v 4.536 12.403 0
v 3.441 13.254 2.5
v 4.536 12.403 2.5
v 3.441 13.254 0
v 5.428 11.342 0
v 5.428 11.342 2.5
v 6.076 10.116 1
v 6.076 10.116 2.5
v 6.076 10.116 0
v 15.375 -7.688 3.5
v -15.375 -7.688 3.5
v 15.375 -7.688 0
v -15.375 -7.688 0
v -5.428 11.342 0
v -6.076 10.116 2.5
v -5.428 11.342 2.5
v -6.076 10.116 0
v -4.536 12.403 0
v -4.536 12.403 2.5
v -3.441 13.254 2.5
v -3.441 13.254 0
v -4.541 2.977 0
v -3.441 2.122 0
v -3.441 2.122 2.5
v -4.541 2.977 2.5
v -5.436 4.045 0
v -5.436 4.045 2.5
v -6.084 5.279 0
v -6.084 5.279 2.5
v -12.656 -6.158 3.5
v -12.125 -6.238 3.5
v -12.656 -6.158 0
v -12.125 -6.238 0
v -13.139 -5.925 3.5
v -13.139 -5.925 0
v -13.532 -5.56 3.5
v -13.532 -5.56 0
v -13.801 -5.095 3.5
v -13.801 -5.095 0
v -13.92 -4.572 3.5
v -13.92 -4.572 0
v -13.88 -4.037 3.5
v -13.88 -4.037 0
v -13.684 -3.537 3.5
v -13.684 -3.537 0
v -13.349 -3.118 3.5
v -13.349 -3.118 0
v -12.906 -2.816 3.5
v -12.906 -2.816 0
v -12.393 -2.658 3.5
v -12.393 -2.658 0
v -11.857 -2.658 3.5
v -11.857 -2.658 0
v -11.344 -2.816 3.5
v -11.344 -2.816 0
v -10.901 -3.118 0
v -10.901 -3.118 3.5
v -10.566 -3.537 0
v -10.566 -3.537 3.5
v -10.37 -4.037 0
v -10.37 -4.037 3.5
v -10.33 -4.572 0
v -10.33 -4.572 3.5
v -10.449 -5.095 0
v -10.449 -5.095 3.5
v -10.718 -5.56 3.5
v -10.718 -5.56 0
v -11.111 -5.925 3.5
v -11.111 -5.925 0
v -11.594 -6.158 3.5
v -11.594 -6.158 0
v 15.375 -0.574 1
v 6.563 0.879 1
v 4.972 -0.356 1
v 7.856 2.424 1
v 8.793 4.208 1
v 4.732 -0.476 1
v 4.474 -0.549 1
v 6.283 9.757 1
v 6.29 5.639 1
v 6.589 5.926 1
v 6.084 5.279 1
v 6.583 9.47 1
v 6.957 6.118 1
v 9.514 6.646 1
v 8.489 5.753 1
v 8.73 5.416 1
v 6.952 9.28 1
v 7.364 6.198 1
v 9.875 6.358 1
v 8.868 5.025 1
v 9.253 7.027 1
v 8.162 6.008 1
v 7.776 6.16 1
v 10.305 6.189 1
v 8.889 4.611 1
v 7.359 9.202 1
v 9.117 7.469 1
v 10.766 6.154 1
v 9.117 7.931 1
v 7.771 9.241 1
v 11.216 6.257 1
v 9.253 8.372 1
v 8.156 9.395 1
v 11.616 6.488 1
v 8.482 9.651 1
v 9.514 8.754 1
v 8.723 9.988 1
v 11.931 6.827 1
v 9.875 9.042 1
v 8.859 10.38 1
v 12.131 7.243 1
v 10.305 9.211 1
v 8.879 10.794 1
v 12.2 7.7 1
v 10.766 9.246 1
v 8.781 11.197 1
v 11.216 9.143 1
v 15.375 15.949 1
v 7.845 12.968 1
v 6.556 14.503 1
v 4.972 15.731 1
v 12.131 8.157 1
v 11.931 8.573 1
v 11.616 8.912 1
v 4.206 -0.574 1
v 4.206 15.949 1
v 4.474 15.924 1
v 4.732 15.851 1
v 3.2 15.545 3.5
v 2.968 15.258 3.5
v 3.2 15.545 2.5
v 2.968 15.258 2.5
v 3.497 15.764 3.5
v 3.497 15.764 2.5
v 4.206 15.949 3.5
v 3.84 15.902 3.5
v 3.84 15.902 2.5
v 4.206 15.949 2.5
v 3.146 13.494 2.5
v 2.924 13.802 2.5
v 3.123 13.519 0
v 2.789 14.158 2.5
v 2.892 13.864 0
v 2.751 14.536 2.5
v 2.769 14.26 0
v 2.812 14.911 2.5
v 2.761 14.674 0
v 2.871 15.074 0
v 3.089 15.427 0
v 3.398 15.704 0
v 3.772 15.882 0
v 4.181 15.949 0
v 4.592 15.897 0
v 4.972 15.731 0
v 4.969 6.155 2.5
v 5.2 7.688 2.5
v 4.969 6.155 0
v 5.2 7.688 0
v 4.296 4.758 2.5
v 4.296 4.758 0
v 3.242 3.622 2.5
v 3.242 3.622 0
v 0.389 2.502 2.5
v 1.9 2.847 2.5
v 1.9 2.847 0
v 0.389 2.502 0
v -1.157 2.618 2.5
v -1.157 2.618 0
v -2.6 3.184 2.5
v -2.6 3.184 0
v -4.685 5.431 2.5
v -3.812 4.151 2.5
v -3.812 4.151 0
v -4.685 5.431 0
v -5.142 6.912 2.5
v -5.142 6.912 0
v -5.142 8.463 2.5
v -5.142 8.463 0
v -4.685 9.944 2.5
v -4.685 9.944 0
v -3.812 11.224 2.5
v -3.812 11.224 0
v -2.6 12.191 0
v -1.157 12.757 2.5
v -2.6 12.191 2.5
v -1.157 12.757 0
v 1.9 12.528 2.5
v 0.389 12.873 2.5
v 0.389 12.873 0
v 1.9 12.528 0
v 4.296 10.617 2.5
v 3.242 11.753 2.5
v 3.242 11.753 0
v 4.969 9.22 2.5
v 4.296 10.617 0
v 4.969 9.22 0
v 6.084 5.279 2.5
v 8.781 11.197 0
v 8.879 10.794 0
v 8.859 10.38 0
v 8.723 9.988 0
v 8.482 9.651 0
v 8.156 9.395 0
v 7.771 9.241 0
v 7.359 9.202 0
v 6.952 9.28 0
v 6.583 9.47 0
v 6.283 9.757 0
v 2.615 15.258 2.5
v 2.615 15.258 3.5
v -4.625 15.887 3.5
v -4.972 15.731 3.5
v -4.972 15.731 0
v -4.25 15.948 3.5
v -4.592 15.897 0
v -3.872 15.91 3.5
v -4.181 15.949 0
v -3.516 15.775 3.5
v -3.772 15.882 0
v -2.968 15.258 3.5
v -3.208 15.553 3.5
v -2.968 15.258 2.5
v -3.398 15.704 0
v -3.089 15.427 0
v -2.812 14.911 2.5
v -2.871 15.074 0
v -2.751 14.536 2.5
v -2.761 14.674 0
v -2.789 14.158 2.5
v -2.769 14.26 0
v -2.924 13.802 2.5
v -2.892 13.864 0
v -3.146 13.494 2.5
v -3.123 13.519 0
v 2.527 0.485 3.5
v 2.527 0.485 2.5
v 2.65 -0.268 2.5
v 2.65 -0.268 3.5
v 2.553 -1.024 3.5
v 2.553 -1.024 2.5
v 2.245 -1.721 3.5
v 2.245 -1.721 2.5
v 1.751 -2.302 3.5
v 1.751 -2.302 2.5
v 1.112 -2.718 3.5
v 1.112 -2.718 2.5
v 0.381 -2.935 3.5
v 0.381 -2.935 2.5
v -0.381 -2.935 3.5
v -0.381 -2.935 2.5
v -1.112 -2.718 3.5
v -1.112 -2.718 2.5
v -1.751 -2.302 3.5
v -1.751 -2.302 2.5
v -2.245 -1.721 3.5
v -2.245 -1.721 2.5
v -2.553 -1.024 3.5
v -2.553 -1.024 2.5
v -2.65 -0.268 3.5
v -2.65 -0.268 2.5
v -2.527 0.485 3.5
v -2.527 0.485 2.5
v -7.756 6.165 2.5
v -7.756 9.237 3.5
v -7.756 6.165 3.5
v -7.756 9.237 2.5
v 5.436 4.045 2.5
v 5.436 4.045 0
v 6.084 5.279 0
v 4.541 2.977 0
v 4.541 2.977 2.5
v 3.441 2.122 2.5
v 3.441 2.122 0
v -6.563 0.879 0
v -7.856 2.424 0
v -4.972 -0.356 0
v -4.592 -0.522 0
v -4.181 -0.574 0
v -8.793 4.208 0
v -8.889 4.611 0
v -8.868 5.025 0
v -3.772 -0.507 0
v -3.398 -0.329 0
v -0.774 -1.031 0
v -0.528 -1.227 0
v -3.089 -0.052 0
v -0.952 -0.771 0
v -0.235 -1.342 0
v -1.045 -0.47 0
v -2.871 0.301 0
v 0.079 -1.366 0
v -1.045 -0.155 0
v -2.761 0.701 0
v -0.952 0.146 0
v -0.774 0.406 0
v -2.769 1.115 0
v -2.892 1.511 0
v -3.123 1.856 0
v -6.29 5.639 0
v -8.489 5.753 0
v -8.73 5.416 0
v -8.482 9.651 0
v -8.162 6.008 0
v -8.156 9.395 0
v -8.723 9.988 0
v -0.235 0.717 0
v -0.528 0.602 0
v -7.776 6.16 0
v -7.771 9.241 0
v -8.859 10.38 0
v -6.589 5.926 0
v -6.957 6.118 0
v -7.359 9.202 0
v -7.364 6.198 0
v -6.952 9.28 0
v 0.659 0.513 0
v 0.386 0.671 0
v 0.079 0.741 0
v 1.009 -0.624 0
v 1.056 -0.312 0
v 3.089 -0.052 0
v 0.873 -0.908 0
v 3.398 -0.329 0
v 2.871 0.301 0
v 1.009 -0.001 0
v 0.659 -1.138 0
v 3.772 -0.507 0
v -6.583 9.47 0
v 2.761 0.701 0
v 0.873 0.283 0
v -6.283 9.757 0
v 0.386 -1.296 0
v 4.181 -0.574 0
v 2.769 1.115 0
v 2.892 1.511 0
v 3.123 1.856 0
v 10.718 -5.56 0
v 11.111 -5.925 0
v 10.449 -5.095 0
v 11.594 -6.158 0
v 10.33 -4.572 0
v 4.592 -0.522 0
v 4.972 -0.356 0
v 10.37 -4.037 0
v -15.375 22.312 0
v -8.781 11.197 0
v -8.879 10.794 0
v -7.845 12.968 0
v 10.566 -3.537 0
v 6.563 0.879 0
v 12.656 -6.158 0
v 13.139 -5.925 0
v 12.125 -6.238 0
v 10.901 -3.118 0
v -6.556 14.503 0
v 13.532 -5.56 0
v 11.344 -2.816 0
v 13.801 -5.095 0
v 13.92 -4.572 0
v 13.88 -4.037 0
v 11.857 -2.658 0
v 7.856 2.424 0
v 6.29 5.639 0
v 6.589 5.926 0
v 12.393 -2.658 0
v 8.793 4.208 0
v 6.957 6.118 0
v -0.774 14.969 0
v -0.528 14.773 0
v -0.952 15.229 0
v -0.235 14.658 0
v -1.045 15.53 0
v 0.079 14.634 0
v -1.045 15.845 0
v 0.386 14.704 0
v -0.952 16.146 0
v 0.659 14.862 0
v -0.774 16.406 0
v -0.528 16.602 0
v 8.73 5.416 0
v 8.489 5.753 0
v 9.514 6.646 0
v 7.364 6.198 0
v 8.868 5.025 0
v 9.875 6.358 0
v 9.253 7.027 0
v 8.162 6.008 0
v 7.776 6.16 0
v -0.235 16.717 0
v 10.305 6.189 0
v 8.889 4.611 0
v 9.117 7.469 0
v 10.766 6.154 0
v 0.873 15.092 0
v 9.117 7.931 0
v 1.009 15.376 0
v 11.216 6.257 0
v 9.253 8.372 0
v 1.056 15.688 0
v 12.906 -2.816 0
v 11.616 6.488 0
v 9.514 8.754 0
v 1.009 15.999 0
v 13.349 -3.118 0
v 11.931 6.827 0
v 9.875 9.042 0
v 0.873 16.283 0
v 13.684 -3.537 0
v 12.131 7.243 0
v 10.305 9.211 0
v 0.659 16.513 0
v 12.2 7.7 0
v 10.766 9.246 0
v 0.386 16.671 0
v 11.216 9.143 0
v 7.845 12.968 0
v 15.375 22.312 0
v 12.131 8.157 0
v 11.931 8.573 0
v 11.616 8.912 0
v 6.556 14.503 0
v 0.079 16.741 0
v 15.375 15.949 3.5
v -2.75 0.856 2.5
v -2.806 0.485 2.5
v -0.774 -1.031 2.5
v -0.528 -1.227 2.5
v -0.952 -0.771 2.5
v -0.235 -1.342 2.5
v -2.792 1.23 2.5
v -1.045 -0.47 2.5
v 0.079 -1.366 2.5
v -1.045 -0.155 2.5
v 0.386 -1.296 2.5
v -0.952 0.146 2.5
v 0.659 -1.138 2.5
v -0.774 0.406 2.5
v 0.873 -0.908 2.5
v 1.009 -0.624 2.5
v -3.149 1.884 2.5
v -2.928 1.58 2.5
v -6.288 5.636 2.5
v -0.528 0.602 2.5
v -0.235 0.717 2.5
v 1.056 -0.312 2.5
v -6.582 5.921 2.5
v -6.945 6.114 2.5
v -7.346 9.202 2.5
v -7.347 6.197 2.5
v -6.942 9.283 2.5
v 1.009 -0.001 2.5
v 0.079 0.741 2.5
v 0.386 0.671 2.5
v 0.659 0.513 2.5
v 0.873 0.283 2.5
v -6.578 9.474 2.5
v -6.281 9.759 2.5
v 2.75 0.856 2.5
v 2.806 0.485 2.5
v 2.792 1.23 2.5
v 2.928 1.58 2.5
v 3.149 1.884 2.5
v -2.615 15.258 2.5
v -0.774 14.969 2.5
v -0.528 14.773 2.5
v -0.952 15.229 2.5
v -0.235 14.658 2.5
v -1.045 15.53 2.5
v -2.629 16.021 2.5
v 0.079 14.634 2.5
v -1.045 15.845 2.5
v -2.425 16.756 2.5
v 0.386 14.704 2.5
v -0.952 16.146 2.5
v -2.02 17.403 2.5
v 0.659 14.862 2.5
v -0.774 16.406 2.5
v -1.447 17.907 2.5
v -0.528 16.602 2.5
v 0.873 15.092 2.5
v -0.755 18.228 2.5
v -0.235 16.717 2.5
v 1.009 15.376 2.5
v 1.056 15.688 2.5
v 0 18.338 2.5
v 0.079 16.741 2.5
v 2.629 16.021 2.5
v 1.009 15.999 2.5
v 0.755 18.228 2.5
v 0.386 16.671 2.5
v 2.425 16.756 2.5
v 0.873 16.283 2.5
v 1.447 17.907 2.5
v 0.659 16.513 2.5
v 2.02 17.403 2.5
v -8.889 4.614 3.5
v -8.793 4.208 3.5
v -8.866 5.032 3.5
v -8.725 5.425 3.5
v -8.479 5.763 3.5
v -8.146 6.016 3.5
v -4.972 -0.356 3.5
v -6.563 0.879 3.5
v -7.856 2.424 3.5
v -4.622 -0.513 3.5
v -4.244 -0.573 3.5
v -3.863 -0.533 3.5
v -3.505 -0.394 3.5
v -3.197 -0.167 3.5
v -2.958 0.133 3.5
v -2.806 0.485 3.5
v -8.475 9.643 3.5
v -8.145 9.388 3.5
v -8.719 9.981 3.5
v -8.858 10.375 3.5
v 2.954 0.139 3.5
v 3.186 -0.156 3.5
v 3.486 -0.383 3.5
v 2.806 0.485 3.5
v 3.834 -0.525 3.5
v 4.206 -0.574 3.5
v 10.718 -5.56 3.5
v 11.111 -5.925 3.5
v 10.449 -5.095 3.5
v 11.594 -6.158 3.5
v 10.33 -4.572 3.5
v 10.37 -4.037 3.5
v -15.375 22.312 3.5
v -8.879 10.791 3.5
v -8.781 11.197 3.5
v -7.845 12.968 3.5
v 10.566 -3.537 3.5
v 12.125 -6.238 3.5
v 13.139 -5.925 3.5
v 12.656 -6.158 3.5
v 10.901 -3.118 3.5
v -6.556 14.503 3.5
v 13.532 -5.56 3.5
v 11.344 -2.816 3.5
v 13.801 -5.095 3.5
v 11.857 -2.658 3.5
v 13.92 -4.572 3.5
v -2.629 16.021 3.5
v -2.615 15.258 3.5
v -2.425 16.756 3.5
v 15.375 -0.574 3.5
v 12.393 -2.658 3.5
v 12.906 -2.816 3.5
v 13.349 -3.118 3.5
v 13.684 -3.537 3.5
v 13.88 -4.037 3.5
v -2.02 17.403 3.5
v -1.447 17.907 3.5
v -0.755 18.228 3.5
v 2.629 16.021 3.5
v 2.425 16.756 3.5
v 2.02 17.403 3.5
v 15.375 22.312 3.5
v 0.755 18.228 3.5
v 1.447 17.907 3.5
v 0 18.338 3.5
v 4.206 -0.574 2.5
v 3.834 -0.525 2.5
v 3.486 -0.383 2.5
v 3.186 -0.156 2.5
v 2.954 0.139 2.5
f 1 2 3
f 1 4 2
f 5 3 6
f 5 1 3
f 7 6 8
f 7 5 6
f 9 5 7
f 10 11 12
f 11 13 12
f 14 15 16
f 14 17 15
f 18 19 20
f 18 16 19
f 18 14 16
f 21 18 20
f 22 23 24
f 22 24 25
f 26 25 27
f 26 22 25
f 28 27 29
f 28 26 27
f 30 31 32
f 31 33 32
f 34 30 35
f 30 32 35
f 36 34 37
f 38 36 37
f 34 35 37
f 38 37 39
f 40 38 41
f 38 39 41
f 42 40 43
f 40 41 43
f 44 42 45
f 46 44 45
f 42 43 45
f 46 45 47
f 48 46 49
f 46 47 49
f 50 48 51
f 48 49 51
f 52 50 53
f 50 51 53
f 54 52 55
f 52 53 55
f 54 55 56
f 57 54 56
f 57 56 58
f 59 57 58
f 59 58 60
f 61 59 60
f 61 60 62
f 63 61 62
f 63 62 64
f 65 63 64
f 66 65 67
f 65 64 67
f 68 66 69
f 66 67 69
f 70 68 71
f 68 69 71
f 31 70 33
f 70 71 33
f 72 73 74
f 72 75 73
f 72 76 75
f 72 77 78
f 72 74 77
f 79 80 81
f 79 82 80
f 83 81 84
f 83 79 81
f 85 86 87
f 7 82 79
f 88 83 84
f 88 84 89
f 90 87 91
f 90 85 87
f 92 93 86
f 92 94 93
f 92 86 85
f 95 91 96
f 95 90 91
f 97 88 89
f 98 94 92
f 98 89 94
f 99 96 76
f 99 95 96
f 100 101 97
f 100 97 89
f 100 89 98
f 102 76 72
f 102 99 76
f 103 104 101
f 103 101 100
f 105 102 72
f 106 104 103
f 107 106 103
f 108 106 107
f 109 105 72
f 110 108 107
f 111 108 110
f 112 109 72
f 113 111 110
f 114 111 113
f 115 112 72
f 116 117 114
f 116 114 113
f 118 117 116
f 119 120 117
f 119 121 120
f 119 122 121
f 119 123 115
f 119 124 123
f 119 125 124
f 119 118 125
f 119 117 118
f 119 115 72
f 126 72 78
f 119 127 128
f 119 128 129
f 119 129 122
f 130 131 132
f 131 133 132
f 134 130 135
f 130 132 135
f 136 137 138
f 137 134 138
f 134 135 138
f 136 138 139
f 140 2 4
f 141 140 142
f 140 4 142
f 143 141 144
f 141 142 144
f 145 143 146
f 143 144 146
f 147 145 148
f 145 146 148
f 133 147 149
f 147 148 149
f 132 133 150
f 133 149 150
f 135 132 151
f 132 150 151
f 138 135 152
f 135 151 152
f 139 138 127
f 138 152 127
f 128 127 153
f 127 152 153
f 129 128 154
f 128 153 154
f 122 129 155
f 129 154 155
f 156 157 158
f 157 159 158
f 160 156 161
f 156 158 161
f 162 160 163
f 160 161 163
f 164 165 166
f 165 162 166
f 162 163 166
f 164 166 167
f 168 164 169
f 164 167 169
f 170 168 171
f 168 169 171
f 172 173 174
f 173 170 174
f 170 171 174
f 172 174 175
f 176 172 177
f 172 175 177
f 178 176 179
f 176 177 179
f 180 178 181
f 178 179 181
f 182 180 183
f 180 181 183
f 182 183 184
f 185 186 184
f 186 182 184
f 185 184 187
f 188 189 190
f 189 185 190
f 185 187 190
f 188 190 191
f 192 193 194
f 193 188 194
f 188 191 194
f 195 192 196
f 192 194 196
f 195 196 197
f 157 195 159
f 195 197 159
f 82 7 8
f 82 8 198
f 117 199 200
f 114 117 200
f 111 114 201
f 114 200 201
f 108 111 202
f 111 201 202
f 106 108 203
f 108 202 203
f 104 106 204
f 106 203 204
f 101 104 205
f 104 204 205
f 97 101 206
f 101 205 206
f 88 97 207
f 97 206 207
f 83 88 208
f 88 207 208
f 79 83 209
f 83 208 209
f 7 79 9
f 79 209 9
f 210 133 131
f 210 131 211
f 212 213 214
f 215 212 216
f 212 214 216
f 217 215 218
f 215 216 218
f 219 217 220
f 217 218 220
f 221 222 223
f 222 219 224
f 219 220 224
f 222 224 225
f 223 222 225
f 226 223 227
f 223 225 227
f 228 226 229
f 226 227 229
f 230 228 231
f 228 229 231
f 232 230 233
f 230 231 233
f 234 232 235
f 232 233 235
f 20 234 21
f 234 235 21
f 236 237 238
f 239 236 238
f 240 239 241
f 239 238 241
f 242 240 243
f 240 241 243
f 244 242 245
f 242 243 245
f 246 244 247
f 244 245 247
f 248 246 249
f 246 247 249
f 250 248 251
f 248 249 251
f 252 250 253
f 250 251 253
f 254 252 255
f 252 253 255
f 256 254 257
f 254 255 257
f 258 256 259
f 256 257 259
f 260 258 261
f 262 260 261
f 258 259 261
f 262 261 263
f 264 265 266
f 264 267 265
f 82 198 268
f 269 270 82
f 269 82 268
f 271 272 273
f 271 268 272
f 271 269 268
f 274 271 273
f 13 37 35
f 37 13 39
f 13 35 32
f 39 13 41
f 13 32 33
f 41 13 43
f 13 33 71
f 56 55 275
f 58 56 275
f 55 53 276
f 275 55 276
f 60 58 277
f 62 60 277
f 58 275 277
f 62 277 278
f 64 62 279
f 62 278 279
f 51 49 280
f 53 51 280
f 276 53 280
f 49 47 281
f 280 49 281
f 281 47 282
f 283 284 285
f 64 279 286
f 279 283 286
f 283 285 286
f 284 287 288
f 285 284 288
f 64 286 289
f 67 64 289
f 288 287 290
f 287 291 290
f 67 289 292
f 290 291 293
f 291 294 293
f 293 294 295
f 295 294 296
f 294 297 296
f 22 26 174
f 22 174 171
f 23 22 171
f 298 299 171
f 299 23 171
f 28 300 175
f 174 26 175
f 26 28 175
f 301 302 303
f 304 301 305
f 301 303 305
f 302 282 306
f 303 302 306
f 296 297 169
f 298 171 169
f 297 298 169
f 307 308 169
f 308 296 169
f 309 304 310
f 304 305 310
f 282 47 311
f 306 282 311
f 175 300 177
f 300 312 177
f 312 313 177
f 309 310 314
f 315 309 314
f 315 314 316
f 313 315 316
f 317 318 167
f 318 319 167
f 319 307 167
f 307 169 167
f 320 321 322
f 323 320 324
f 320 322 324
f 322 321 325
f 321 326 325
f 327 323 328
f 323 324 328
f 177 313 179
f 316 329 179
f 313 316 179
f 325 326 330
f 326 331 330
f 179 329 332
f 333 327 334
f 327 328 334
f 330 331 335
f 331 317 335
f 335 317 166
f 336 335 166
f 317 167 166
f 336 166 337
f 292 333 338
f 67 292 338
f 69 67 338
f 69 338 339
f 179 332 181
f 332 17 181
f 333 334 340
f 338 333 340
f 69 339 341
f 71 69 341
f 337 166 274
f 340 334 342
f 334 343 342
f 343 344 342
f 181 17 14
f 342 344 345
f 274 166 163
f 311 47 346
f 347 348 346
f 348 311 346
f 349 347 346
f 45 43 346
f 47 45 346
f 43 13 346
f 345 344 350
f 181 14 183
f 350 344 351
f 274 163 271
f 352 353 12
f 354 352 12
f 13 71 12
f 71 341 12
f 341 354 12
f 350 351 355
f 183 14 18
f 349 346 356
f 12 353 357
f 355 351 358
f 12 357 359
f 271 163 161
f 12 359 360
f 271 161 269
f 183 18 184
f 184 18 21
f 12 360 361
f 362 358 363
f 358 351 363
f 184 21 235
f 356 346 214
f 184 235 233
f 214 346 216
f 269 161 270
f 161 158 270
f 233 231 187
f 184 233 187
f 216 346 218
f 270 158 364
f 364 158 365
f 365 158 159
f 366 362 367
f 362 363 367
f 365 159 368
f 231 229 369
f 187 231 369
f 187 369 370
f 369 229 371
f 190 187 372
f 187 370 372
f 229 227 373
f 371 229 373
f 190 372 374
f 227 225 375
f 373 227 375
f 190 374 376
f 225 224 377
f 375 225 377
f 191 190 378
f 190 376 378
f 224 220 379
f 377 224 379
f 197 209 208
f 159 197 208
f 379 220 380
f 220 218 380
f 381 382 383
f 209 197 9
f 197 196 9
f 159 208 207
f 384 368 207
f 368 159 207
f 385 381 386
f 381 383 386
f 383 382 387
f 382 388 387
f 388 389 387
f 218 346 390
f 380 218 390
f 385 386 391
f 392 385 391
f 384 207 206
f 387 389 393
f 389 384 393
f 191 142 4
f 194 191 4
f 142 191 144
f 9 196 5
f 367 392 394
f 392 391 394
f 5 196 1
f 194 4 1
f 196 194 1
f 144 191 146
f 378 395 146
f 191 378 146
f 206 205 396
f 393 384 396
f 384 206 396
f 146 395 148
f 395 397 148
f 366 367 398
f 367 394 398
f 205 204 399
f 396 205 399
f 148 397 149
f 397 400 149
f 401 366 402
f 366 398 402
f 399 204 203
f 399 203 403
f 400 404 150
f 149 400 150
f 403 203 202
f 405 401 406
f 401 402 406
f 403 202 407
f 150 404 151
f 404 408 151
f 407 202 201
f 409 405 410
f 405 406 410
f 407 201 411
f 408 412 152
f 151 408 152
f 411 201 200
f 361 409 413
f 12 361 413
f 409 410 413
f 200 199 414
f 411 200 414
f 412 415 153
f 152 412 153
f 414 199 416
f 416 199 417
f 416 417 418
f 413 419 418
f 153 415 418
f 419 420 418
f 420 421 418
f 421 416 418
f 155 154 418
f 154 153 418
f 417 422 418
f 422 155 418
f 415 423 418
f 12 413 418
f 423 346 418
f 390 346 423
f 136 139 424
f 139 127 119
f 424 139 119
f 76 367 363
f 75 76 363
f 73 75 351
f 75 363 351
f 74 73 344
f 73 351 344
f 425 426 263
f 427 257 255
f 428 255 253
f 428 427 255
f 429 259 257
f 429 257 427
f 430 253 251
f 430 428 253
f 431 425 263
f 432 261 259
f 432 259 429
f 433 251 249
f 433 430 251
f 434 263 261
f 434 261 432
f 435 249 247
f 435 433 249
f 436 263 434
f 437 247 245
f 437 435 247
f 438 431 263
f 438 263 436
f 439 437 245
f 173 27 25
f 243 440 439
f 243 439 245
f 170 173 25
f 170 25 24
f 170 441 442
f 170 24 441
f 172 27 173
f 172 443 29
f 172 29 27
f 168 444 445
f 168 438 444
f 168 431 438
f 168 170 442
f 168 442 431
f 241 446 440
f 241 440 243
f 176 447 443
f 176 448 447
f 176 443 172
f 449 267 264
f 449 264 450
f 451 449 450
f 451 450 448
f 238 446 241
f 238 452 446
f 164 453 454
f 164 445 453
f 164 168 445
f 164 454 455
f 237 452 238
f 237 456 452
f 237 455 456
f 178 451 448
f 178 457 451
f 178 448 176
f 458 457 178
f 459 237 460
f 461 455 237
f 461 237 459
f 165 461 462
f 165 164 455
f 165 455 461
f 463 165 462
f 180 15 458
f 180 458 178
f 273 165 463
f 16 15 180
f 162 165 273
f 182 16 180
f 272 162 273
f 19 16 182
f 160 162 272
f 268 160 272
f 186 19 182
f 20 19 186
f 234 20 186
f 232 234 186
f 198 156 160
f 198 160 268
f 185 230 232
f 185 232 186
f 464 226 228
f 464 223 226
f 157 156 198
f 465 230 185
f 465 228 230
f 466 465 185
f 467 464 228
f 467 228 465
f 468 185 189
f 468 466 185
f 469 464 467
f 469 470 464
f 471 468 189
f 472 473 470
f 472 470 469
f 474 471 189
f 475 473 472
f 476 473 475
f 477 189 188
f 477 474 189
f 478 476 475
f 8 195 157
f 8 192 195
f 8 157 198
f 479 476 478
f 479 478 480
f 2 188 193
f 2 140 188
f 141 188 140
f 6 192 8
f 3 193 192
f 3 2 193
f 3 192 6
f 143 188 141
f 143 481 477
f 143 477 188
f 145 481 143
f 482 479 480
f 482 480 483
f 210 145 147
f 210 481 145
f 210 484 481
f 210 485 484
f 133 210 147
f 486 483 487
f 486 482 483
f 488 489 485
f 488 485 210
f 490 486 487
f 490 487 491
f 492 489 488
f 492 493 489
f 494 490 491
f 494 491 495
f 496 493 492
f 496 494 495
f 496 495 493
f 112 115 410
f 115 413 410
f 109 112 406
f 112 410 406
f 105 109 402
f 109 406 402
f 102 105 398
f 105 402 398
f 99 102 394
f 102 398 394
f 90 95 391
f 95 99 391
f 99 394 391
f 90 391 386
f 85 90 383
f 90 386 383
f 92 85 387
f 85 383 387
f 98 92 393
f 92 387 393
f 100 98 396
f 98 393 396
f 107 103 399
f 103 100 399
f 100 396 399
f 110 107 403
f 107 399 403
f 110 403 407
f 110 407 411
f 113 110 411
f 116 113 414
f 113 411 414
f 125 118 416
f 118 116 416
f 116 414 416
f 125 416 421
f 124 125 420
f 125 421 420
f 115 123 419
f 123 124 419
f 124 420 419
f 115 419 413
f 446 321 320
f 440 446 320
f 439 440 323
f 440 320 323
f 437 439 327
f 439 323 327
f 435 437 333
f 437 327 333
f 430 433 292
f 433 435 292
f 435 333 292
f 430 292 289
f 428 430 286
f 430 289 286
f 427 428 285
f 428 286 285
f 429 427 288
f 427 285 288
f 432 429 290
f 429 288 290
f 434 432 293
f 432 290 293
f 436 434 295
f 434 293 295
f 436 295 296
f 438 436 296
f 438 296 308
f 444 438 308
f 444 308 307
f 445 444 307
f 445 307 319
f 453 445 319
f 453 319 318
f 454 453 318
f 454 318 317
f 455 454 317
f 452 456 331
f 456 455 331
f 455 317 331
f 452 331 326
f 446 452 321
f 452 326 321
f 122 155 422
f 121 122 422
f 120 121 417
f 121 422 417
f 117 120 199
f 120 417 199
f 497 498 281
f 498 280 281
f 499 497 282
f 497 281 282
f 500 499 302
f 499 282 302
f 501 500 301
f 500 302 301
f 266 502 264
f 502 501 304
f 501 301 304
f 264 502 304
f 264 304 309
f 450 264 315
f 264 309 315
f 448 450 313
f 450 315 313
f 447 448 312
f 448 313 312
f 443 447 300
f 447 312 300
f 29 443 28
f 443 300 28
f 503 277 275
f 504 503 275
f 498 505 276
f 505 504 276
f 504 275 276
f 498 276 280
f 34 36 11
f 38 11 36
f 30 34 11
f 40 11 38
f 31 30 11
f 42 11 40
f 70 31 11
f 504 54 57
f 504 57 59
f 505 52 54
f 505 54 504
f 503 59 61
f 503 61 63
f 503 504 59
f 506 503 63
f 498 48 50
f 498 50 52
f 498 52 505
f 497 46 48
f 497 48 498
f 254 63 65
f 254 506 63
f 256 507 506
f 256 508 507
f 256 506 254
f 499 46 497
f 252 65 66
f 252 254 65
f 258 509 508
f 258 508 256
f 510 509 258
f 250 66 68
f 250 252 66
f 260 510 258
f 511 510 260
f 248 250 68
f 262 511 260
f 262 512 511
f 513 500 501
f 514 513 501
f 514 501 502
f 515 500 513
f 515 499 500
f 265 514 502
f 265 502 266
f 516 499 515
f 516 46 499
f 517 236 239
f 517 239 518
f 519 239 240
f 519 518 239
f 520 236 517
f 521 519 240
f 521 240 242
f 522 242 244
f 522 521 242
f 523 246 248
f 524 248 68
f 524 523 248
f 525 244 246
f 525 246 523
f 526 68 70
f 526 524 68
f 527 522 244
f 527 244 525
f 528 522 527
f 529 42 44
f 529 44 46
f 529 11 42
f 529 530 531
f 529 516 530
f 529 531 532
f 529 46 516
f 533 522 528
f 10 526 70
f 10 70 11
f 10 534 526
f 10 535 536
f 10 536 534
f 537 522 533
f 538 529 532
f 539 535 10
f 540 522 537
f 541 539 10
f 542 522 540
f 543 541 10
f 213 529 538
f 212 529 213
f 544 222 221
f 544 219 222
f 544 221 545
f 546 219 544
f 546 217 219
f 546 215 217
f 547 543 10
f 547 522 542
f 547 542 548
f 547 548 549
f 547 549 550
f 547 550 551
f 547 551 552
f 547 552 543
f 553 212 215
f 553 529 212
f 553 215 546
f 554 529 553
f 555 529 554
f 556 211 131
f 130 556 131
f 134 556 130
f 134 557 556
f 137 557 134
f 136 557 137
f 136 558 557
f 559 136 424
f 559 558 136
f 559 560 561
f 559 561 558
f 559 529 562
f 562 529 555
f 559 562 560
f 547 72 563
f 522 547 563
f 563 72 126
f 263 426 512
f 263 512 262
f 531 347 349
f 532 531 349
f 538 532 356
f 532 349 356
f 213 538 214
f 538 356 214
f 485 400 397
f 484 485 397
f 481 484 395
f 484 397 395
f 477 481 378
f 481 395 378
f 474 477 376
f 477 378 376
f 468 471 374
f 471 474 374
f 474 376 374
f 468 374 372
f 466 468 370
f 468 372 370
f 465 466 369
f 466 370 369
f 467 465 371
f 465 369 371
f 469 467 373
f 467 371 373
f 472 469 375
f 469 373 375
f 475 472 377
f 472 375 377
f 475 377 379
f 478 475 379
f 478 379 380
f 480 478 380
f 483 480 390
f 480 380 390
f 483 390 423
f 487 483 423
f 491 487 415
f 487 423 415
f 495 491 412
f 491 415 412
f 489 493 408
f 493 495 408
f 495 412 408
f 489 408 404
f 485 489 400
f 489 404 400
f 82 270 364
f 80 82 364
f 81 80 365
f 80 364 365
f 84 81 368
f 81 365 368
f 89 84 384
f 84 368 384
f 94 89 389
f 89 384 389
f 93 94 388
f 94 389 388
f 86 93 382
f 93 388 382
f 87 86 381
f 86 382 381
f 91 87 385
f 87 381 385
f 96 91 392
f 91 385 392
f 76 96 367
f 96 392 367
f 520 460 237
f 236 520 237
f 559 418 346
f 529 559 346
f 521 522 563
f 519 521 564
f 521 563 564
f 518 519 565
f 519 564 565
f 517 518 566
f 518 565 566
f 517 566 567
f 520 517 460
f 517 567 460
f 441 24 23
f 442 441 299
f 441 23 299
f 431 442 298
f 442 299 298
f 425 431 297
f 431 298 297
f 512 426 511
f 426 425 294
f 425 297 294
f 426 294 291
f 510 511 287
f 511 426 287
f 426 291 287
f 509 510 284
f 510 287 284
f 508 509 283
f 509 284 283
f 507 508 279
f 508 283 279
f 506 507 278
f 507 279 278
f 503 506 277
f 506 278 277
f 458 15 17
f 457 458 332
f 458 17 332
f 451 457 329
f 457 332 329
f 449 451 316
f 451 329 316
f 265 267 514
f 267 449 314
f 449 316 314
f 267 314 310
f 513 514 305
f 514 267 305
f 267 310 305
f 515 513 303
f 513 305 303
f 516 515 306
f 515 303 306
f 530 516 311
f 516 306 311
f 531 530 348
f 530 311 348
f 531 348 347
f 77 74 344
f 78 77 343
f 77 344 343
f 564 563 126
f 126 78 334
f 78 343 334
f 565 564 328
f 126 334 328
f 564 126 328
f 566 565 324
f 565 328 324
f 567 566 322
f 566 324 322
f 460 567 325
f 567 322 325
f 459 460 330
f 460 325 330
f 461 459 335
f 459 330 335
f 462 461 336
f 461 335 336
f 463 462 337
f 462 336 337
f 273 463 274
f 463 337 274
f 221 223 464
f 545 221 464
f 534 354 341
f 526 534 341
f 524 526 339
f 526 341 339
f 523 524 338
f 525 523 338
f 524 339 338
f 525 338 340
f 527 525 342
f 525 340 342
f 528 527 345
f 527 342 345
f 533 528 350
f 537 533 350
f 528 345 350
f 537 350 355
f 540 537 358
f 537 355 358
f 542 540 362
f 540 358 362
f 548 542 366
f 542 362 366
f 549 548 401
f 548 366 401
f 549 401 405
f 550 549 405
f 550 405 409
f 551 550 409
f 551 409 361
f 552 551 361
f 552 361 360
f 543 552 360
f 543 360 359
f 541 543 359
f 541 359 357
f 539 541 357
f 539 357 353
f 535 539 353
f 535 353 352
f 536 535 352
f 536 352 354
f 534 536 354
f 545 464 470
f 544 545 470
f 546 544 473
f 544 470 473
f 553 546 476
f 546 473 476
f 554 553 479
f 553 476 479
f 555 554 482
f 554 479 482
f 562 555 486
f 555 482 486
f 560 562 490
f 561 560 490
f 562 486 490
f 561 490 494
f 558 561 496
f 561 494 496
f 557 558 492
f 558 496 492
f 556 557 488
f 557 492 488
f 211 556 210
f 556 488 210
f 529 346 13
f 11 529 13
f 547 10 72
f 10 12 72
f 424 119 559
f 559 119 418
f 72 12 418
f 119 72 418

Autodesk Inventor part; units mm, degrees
ref_plane "YZ Plane" through (0, 0, 0) normal (1, 0, 0) x (0, 1, 0)
ref_plane "XZ Plane" through (0, 0, 0) normal (0, 1, 0) x (-1, 0, 0)
ref_plane "XY Plane" through (0, 0, 0) normal (0, 0, 1) x (1, 0, 0)
ref_plane "Work Plane1" through (0, 0, 0) normal (0, 0, 1) x (1, 0, 0)
sketch "Sketch1" plane through (0, 0, 0) normal (0, 0, 1) x (1, 0, 0)
  arc A0 (-3.651, 13.5937) -> (-4.7619, 15.391) centre (-4.2064, 14.4923) ccw projected
  arc A1 (-3.651, 13.5937) -> (-6.4477, 10.2643) centre (0, 7.6875) ccw projected
  arc A2 (-8.4097, 11.0483) -> (-6.4477, 10.2643) centre (-7.4287, 10.6563) ccw projected
  arc A3 (-4.7619, 15.391) -> (-8.4097, 11.0483) centre (0, 7.6875) ccw projected
  arc A4 (6.4477, 10.2643) -> (8.4097, 11.0483) centre (7.4287, 10.6563) ccw projected
  arc A5 (6.4477, 10.2643) -> (3.651, 13.5937) centre (0, 7.6875) ccw projected
  arc A6 (4.7619, 15.391) -> (3.651, 13.5937) centre (4.2064, 14.4923) ccw projected
  arc A7 (8.4097, 11.0483) -> (4.7619, 15.391) centre (0, 7.6875) ccw projected
  arc A8 (-6.4563, 5.1322) -> (-8.4209, 4.3547) centre (-7.4386, 4.7434) ccw projected
  arc A9 (-6.4563, 5.1322) -> (-3.651, 1.7813) centre (0, 7.6875) ccw projected
  arc A10 (-4.7619, -0.016) -> (-3.651, 1.7813) centre (-4.2064, 0.8827) ccw projected
  arc A11 (-8.4209, 4.3547) -> (-4.7619, -0.016) centre (0, 7.6875) ccw projected
  arc A12 (3.651, 1.7813) -> (4.7619, -0.016) centre (4.2064, 0.8827) ccw projected
  arc A13 (3.651, 1.7813) -> (6.4563, 5.1322) centre (0, 7.6875) ccw projected
  arc A14 (8.4209, 4.3547) -> (6.4563, 5.1322) centre (7.4386, 4.7434) ccw projected
  arc A15 (4.7619, -0.016) -> (8.4209, 4.3547) centre (0, 7.6875) ccw projected
  circle A16 centre (10.65, 7.6999) radius 1.15 projected
  circle A17 centre (0, 15.6875) radius 1.0564 projected
  circle A18 centre (0, -0.3125) radius 1.0564 projected
  circle A19 centre (0, 7.6875) radius 5 projected
  circle A20 centre (0, 7.6875) radius 13.7 projected
  line L0 (-116.625, -11.1875) -> (15.375, -11.1875) projected
  line L1 (15.375, -11.1875) -> (15.375, -7.6875) projected
  line L2 (-116.625, -7.6875) -> (15.375, -7.6875) projected
  line L3 (-116.625, -11.1875) -> (-116.625, -7.6875) projected
  line L4 (15.375, -7.6875) -> (-15.375, -7.6875)
  line L5 (-15.375, -7.6875) -> (-15.375, 22.3125)
  line L6 (-15.375, 22.3125) -> (15.375, 22.3125)
  line L7 (15.375, 22.3125) -> (15.375, -7.6875)
  circle A21 centre (0, 7.6875) radius 14.375 projected
  circle A22 centre (0, 7.6875) radius 5.2
  arc A23 (-3.4406, 13.2535) -> (-4.9722, 15.7312) centre (-4.2064, 14.4923) ccw
  arc A24 (-3.4406, 13.2535) -> (-6.0763, 10.1158) centre (0, 7.6875) ccw
  arc A25 (-8.7812, 11.1968) -> (-6.0763, 10.1158) centre (-7.4287, 10.6563) ccw
  arc A26 (-4.9722, 15.7312) -> (-8.7812, 11.1968) centre (0, 7.6875) ccw
  arc A27 (4.9722, 15.7312) -> (3.4406, 13.2535) centre (4.2064, 14.4923) ccw
  arc A28 (6.0763, 10.1158) -> (3.4406, 13.2535) centre (0, 7.6875) ccw
  arc A29 (6.0763, 10.1158) -> (8.7812, 11.1968) centre (7.4287, 10.6563) ccw
  arc A30 (8.7812, 11.1968) -> (4.9722, 15.7312) centre (0, 7.6875) ccw
  arc A31 (3.4406, 2.1215) -> (6.0844, 5.2794) centre (0, 7.6875) ccw
  arc A32 (3.4406, 2.1215) -> (4.9722, -0.3562) centre (4.2064, 0.8827) ccw
  arc A33 (4.9722, -0.3562) -> (8.7928, 4.2075) centre (0, 7.6875) ccw
  arc A34 (8.7928, 4.2075) -> (6.0844, 5.2794) centre (7.4386, 4.7434) ccw
  arc A35 (-6.0844, 5.2794) -> (-8.7928, 4.2075) centre (-7.4386, 4.7434) ccw
  arc A36 (-6.0844, 5.2794) -> (-3.4406, 2.1215) centre (0, 7.6875) ccw
  arc A37 (-4.9722, -0.3562) -> (-3.4406, 2.1215) centre (-4.2064, 0.8827) ccw
  arc A38 (-8.7928, 4.2075) -> (-4.9722, -0.3562) centre (0, 7.6875) ccw
  circle A39 centre (10.65, 7.6999) radius 1.55
  point P0 (0, 0)
  dimension "d0" = 30
  dimension "d1" = 15.375
  dimension "d2" = 15.375
  dimension "d3" = 0.2
  dimension "d4" = 0.4
  dimension "d5" = 0.4
  dimension "d6" = 0.4
  dimension "d7" = 0.4
  dimension "d8" = 0.4
extrude "Extrusion1" add sketch "Sketch1" along normal blind 1 contours A20 | L2 L5 L6 L7 | A21
sketch "Sketch2" plane through (0, 0, 1) normal (0, 0, 1) x (1, 0, 0)
  line L0 (15.375, 22.3125) -> (-15.375, 22.3125) projected
  line L1 (-15.375, 22.3125) -> (-15.375, -7.6875) projected
  line L2 (-15.375, -7.6875) -> (15.375, -7.6875) projected
  line L3 (15.375, -7.6875) -> (15.375, 22.3125) projected
  circle A0 centre (0, 15.6875) radius 1.0564 projected
  circle A1 centre (0, -0.3125) radius 1.0564 projected
  circle A2 centre (0, 7.6875) radius 5.2 projected
  arc A3 (-3.4406, 13.2535) -> (-6.0763, 10.1158) centre (0, 7.6875) ccw projected
  arc A4 (-8.7812, 11.1968) -> (-6.0763, 10.1158) centre (-7.4287, 10.6563) ccw projected
  arc A5 (-4.9722, 15.7312) -> (-8.7812, 11.1968) centre (0, 7.6875) ccw projected
  arc A6 (-3.4406, 13.2535) -> (-4.9722, 15.7312) centre (-4.2064, 14.4923) ccw projected
  arc A7 (6.0763, 10.1158) -> (3.4406, 13.2535) centre (0, 7.6875) ccw projected
  arc A8 (4.9722, 15.7312) -> (3.4406, 13.2535) centre (4.2064, 14.4923) ccw projected
  arc A9 (8.7812, 11.1968) -> (4.9722, 15.7312) centre (0, 7.6875) ccw projected
  arc A10 (6.0763, 10.1158) -> (8.7812, 11.1968) centre (7.4287, 10.6563) ccw projected
  arc A11 (3.4406, 2.1215) -> (4.9722, -0.3562) centre (4.2064, 0.8827) ccw projected
  arc A12 (3.4406, 2.1215) -> (6.0844, 5.2794) centre (0, 7.6875) ccw projected
  arc A13 (8.7928, 4.2075) -> (6.0844, 5.2794) centre (7.4386, 4.7434) ccw projected
  arc A14 (4.9722, -0.3562) -> (8.7928, 4.2075) centre (0, 7.6875) ccw projected
  arc A15 (-6.0844, 5.2794) -> (-3.4406, 2.1215) centre (0, 7.6875) ccw projected
  arc A16 (-4.9722, -0.3562) -> (-3.4406, 2.1215) centre (-4.2064, 0.8827) ccw projected
  arc A17 (-8.7928, 4.2075) -> (-4.9722, -0.3562) centre (0, 7.6875) ccw projected
  arc A18 (-6.0844, 5.2794) -> (-8.7928, 4.2075) centre (-7.4386, 4.7434) ccw projected
  circle A19 centre (10.65, 7.6999) radius 1.55 projected
  arc A20 (4.9722, 15.7312) -> (3.4406, 13.2535) centre (4.2064, 14.4923) ccw projected
  line L4 (4.2064, 15.9488) -> (15.375, 15.9488)
  line L5 (15.375, -7.6875) -> (15.375, 22.3125) projected
  line L6 (4.2064, -0.5738) -> (15.375, -0.5738)
  arc A21 (6.0763, 10.1158) -> (8.7812, 11.1968) centre (7.4287, 10.6563) ccw projected
  line L7 (6.0763, 10.1158) -> (6.0844, 5.2794)
  point P0 (0, 0)
extrude "Extrusion2" add sketch "Sketch2" along normal blind 1.5 contours L3 L4 A8 A7 L7 A12 A11 L6 L2 L1 L0
sketch "Sketch3" plane through (0, 0, 2.5) normal (0, 0, 1) x (1, 0, 0)
  line L0 (15.375, -7.6875) -> (15.375, -0.5738) projected
  line L1 (15.375, -0.5738) -> (4.2064, -0.5738) projected
  arc A0 (3.4406, 2.1215) -> (4.2064, -0.5738) centre (4.2064, 0.8827) ccw projected
  arc A1 (3.4406, 2.1215) -> (6.0844, 5.2794) centre (0, 7.6875) ccw projected
  line L2 (6.0844, 5.2794) -> (6.0763, 10.1158) projected
  arc A2 (6.0763, 10.1158) -> (3.4406, 13.2535) centre (0, 7.6875) ccw projected
  arc A3 (4.2064, 15.9488) -> (3.4406, 13.2535) centre (4.2064, 14.4923) ccw projected
  line L3 (4.2064, 15.9488) -> (15.375, 15.9488) projected
  line L4 (15.375, 15.9488) -> (15.375, 22.3125) projected
  line L5 (15.375, 22.3125) -> (-15.375, 22.3125) projected
  line L6 (-15.375, 22.3125) -> (-15.375, -7.6875) projected
  line L7 (-15.375, -7.6875) -> (15.375, -7.6875) projected
  circle A4 centre (0, 15.6875) radius 1.0564 projected
  circle A5 centre (0, -0.3125) radius 1.0564 projected
  arc A6 (-6.0844, 5.2794) -> (-8.7928, 4.2075) centre (-7.4386, 4.7434) ccw projected
  arc A7 (-6.0844, 5.2794) -> (-3.4406, 2.1215) centre (0, 7.6875) ccw projected
  arc A8 (-4.9722, -0.3562) -> (-3.4406, 2.1215) centre (-4.2064, 0.8827) ccw projected
  arc A9 (-8.7928, 4.2075) -> (-4.9722, -0.3562) centre (0, 7.6875) ccw projected
  arc A10 (-3.4406, 13.2535) -> (-4.9722, 15.7312) centre (-4.2064, 14.4923) ccw projected
  arc A11 (-3.4406, 13.2535) -> (-6.0763, 10.1158) centre (0, 7.6875) ccw projected
  arc A12 (-8.7812, 11.1968) -> (-6.0763, 10.1158) centre (-7.4287, 10.6563) ccw projected
  arc A13 (-4.9722, 15.7312) -> (-8.7812, 11.1968) centre (0, 7.6875) ccw projected
  circle A14 centre (0, 7.6875) radius 5.2 projected
  circle A15 centre (0, 15.6875) radius 2.65
  circle A16 centre (0, -0.3125) radius 1.0564 projected
  circle A17 centre (0, -0.3125) radius 2.65
  arc A18 (-2.4425, 10.6818) -> (-4.3563, 11.5819) centre (-5.3868, 6.906) ccw projected
  arc A19 (-4.3563, 11.5819) -> (-4.9119, 10.8525) centre (0, 7.6875) ccw projected
  arc A20 (-4.9119, 10.8525) -> (-3.5356, 9.2466) centre (-0.678, 13.0883) ccw projected
  arc A21 (-3.5356, 9.2466) -> (-3.736, 8.6743) centre (0, 7.6875) ccw projected
  arc A22 (-3.736, 8.6743) -> (-5.8134, 8.2775) centre (-3.8987, 3.889) ccw projected
  arc A23 (-5.8134, 8.2775) -> (-5.8341, 7.3609) centre (0, 7.6875) ccw projected
  arc A24 (-5.8341, 7.3609) -> (-3.7768, 6.8706) centre (-3.723, 11.6584) ccw projected
  arc A25 (-3.7768, 6.8706) -> (-3.6025, 6.2899) centre (0, 7.6875) ccw projected
  arc A26 (-3.6025, 6.2899) -> (-5.05, 4.7478) centre (-0.9214, 2.3228) ccw projected
  arc A27 (-5.05, 4.7478) -> (-4.5279, 3.994) centre (0, 7.6875) ccw projected
  arc A28 (-4.5279, 3.994) -> (-2.5753, 4.8067) centre (-5.346, 8.7117) ccw projected
  arc A29 (-2.5753, 4.8067) -> (-2.093, 4.4393) centre (0, 7.6875) ccw projected
  arc A30 (-2.093, 4.4393) -> (-2.3576, 2.341) centre (2.4078, 2.8058) ccw projected
  arc A31 (-2.3576, 2.341) -> (-1.4922, 2.038) centre (0, 7.6875) ccw projected
  arc A32 (-1.4922, 2.038) -> (-0.3902, 3.8431) centre (-4.927, 5.3738) ccw projected
  arc A33 (-0.3902, 3.8431) -> (0.216, 3.8294) centre (0, 7.6875) ccw projected
  arc A34 (0.216, 3.8294) -> (1.2353, 1.9763) centre (4.8174, 5.1534) ccw projected
  arc A35 (1.2353, 1.9763) -> (2.1135, 2.2398) centre (0, 7.6875) ccw projected
  arc A36 (2.1135, 2.2398) -> (1.944, 4.348) centre (-2.6261, 2.9196) ccw projected
  arc A37 (1.944, 4.348) -> (2.4425, 4.6932) centre (0, 7.6875) ccw projected
  arc A38 (2.4425, 4.6932) -> (4.3563, 3.7931) centre (5.3868, 8.469) ccw projected
  arc A39 (4.3563, 3.7931) -> (4.9119, 4.5225) centre (0, 7.6875) ccw projected
  arc A40 (4.9119, 4.5225) -> (3.5356, 6.1284) centre (0.678, 2.2867) ccw projected
  arc A41 (3.5356, 6.1284) -> (3.736, 6.7007) centre (0, 7.6875) ccw projected
  arc A42 (3.736, 6.7007) -> (5.8134, 7.0975) centre (3.8987, 11.486) ccw projected
  arc A43 (5.8134, 7.0975) -> (5.8341, 8.0141) centre (0, 7.6875) ccw projected
  arc A44 (5.8341, 8.0141) -> (3.7768, 8.5044) centre (3.723, 3.7166) ccw projected
  arc A45 (3.7768, 8.5044) -> (3.6025, 9.0851) centre (0, 7.6875) ccw projected
  arc A46 (3.6025, 9.0851) -> (5.05, 10.6272) centre (0.9214, 13.0522) ccw projected
  arc A47 (5.05, 10.6272) -> (4.5279, 11.381) centre (0, 7.6875) ccw projected
  arc A48 (4.5279, 11.381) -> (2.5753, 10.5683) centre (5.346, 6.6633) ccw projected
  arc A49 (2.5753, 10.5683) -> (2.093, 10.9357) centre (0, 7.6875) ccw projected
  arc A50 (2.093, 10.9357) -> (2.3576, 13.034) centre (-2.4078, 12.5692) ccw projected
  arc A51 (2.3576, 13.034) -> (1.4922, 13.337) centre (0, 7.6875) ccw projected
  arc A52 (1.4922, 13.337) -> (0.3902, 11.5319) centre (4.927, 10.0012) ccw projected
  arc A53 (0.3902, 11.5319) -> (-0.216, 11.5456) centre (0, 7.6875) ccw projected
  arc A54 (-0.216, 11.5456) -> (-1.2353, 13.3987) centre (-4.8174, 10.2216) ccw projected
  arc A55 (-1.2353, 13.3987) -> (-2.1135, 13.1352) centre (0, 7.6875) ccw projected
  arc A56 (-2.1135, 13.1352) -> (-1.944, 11.027) centre (2.6261, 12.4554) ccw projected
  arc A57 (-1.944, 11.027) -> (-2.4425, 10.6818) centre (0, 7.6875) ccw projected
  circle A58 centre (0, 7.6875) radius 5.8433
  circle A59 centre (0, 7.6875) radius 6.5436
  arc A60 (-3.4406, 13.2535) -> (-4.9722, 15.7312) centre (-4.2064, 14.4923) ccw projected
  line L8 (-2.9676, 15.2581) -> (-2.615, 15.2581)
  arc A61 (4.9722, 15.7312) -> (3.4406, 13.2535) centre (4.2064, 14.4923) ccw projected
  line L9 (2.9676, 15.2581) -> (2.615, 15.2581)
  arc A62 (3.4406, 2.1215) -> (4.9722, -0.3562) centre (4.2064, 0.8827) ccw projected
  line L10 (2.8055, 0.4846) -> (2.5273, 0.4846)
  arc A63 (-4.9722, -0.3562) -> (-3.4406, 2.1215) centre (-4.2064, 0.8827) ccw projected
  line L11 (-2.8055, 0.4846) -> (-2.5273, 0.4846)
  arc A64 (-8.7812, 11.1968) -> (-6.0763, 10.1158) centre (-7.4287, 10.6563) ccw projected
  line L12 (-7.7556, 9.237) -> (-7.7556, 6.165)
  point P0 (0, 0)
  point P1 (-6.0844, 5.2794)
  point P2 (-6.0763, 10.1158)
  point P3 (2.9676, 15.2581)
  dimension "d13" = 5.3
  dimension "d14" = 5.3
extrude "Extrusion3" add sketch "Sketch3" along normal blind 1 contours L7 L6 L5 L4 L3 A3 L9 A15 L8 A10 A13 A12 L12 A6 A9 A8 L11 A17 L10 A0 L1 L0
sketch "Sketch4" plane through (0, 0, 3.5) normal (0, 0, 1) x (1, 0, 0)
  line L0 (15.375, -0.5738) -> (4.2064, -0.5738) projected
  arc A0 (2.8055, 0.4846) -> (4.2064, -0.5738) centre (4.2064, 0.8827) ccw projected
  line L1 (2.8055, 0.4846) -> (2.5273, 0.4846) projected
  arc A1 (-2.5273, 0.4846) -> (2.5273, 0.4846) centre (0, -0.3125) ccw projected
  line L2 (-2.5273, 0.4846) -> (-2.8055, 0.4846) projected
  arc A2 (-4.9722, -0.3562) -> (-2.8055, 0.4846) centre (-4.2064, 0.8827) ccw projected
  arc A3 (-8.7928, 4.2075) -> (-4.9722, -0.3562) centre (0, 7.6875) ccw projected
  arc A4 (-7.7556, 6.165) -> (-8.7928, 4.2075) centre (-7.4386, 4.7434) ccw projected
  line L3 (-7.7556, 6.165) -> (-7.7556, 9.237) projected
  arc A5 (-8.7812, 11.1968) -> (-7.7556, 9.237) centre (-7.4287, 10.6563) ccw projected
  arc A6 (-4.9722, 15.7312) -> (-8.7812, 11.1968) centre (0, 7.6875) ccw projected
  arc A7 (-2.9676, 15.2581) -> (-4.9722, 15.7312) centre (-4.2064, 14.4923) ccw projected
  line L4 (-2.9676, 15.2581) -> (-2.615, 15.2581) projected
  arc A8 (2.615, 15.2581) -> (-2.615, 15.2581) centre (0, 15.6875) ccw projected
  line L5 (2.615, 15.2581) -> (2.9676, 15.2581) projected
  arc A9 (4.2064, 15.9488) -> (2.9676, 15.2581) centre (4.2064, 14.4923) ccw projected
  line L6 (4.2064, 15.9488) -> (15.375, 15.9488) projected
  line L7 (15.375, 15.9488) -> (15.375, 22.3125) projected
  line L8 (15.375, 22.3125) -> (-15.375, 22.3125) projected
  line L9 (-15.375, 22.3125) -> (-15.375, -7.6875) projected
  line L10 (-15.375, -7.6875) -> (15.375, -7.6875) projected
  line L11 (15.375, -7.6875) -> (15.375, -0.5738) projected
  circle A10 centre (-12.125, -4.4375) radius 3.25
  circle A11 centre (12.125, -4.4375) radius 3.25
  point P0 (0, 0)
  dimension "d17" = 6.5
  dimension "d18" = 6.5
hole "Hole1" at (-12.125, -4.4375, 3.5) at (12.125, -4.4375, 3.5) direction (0, 0, -1) diameter 3.6 end through all clearance for "Countersunk Flat Head Screw ISO 2009/7046" size "M3" standard "ISO"
equation "\"d2\" = d1"
properties part number "front_motur_holder"
